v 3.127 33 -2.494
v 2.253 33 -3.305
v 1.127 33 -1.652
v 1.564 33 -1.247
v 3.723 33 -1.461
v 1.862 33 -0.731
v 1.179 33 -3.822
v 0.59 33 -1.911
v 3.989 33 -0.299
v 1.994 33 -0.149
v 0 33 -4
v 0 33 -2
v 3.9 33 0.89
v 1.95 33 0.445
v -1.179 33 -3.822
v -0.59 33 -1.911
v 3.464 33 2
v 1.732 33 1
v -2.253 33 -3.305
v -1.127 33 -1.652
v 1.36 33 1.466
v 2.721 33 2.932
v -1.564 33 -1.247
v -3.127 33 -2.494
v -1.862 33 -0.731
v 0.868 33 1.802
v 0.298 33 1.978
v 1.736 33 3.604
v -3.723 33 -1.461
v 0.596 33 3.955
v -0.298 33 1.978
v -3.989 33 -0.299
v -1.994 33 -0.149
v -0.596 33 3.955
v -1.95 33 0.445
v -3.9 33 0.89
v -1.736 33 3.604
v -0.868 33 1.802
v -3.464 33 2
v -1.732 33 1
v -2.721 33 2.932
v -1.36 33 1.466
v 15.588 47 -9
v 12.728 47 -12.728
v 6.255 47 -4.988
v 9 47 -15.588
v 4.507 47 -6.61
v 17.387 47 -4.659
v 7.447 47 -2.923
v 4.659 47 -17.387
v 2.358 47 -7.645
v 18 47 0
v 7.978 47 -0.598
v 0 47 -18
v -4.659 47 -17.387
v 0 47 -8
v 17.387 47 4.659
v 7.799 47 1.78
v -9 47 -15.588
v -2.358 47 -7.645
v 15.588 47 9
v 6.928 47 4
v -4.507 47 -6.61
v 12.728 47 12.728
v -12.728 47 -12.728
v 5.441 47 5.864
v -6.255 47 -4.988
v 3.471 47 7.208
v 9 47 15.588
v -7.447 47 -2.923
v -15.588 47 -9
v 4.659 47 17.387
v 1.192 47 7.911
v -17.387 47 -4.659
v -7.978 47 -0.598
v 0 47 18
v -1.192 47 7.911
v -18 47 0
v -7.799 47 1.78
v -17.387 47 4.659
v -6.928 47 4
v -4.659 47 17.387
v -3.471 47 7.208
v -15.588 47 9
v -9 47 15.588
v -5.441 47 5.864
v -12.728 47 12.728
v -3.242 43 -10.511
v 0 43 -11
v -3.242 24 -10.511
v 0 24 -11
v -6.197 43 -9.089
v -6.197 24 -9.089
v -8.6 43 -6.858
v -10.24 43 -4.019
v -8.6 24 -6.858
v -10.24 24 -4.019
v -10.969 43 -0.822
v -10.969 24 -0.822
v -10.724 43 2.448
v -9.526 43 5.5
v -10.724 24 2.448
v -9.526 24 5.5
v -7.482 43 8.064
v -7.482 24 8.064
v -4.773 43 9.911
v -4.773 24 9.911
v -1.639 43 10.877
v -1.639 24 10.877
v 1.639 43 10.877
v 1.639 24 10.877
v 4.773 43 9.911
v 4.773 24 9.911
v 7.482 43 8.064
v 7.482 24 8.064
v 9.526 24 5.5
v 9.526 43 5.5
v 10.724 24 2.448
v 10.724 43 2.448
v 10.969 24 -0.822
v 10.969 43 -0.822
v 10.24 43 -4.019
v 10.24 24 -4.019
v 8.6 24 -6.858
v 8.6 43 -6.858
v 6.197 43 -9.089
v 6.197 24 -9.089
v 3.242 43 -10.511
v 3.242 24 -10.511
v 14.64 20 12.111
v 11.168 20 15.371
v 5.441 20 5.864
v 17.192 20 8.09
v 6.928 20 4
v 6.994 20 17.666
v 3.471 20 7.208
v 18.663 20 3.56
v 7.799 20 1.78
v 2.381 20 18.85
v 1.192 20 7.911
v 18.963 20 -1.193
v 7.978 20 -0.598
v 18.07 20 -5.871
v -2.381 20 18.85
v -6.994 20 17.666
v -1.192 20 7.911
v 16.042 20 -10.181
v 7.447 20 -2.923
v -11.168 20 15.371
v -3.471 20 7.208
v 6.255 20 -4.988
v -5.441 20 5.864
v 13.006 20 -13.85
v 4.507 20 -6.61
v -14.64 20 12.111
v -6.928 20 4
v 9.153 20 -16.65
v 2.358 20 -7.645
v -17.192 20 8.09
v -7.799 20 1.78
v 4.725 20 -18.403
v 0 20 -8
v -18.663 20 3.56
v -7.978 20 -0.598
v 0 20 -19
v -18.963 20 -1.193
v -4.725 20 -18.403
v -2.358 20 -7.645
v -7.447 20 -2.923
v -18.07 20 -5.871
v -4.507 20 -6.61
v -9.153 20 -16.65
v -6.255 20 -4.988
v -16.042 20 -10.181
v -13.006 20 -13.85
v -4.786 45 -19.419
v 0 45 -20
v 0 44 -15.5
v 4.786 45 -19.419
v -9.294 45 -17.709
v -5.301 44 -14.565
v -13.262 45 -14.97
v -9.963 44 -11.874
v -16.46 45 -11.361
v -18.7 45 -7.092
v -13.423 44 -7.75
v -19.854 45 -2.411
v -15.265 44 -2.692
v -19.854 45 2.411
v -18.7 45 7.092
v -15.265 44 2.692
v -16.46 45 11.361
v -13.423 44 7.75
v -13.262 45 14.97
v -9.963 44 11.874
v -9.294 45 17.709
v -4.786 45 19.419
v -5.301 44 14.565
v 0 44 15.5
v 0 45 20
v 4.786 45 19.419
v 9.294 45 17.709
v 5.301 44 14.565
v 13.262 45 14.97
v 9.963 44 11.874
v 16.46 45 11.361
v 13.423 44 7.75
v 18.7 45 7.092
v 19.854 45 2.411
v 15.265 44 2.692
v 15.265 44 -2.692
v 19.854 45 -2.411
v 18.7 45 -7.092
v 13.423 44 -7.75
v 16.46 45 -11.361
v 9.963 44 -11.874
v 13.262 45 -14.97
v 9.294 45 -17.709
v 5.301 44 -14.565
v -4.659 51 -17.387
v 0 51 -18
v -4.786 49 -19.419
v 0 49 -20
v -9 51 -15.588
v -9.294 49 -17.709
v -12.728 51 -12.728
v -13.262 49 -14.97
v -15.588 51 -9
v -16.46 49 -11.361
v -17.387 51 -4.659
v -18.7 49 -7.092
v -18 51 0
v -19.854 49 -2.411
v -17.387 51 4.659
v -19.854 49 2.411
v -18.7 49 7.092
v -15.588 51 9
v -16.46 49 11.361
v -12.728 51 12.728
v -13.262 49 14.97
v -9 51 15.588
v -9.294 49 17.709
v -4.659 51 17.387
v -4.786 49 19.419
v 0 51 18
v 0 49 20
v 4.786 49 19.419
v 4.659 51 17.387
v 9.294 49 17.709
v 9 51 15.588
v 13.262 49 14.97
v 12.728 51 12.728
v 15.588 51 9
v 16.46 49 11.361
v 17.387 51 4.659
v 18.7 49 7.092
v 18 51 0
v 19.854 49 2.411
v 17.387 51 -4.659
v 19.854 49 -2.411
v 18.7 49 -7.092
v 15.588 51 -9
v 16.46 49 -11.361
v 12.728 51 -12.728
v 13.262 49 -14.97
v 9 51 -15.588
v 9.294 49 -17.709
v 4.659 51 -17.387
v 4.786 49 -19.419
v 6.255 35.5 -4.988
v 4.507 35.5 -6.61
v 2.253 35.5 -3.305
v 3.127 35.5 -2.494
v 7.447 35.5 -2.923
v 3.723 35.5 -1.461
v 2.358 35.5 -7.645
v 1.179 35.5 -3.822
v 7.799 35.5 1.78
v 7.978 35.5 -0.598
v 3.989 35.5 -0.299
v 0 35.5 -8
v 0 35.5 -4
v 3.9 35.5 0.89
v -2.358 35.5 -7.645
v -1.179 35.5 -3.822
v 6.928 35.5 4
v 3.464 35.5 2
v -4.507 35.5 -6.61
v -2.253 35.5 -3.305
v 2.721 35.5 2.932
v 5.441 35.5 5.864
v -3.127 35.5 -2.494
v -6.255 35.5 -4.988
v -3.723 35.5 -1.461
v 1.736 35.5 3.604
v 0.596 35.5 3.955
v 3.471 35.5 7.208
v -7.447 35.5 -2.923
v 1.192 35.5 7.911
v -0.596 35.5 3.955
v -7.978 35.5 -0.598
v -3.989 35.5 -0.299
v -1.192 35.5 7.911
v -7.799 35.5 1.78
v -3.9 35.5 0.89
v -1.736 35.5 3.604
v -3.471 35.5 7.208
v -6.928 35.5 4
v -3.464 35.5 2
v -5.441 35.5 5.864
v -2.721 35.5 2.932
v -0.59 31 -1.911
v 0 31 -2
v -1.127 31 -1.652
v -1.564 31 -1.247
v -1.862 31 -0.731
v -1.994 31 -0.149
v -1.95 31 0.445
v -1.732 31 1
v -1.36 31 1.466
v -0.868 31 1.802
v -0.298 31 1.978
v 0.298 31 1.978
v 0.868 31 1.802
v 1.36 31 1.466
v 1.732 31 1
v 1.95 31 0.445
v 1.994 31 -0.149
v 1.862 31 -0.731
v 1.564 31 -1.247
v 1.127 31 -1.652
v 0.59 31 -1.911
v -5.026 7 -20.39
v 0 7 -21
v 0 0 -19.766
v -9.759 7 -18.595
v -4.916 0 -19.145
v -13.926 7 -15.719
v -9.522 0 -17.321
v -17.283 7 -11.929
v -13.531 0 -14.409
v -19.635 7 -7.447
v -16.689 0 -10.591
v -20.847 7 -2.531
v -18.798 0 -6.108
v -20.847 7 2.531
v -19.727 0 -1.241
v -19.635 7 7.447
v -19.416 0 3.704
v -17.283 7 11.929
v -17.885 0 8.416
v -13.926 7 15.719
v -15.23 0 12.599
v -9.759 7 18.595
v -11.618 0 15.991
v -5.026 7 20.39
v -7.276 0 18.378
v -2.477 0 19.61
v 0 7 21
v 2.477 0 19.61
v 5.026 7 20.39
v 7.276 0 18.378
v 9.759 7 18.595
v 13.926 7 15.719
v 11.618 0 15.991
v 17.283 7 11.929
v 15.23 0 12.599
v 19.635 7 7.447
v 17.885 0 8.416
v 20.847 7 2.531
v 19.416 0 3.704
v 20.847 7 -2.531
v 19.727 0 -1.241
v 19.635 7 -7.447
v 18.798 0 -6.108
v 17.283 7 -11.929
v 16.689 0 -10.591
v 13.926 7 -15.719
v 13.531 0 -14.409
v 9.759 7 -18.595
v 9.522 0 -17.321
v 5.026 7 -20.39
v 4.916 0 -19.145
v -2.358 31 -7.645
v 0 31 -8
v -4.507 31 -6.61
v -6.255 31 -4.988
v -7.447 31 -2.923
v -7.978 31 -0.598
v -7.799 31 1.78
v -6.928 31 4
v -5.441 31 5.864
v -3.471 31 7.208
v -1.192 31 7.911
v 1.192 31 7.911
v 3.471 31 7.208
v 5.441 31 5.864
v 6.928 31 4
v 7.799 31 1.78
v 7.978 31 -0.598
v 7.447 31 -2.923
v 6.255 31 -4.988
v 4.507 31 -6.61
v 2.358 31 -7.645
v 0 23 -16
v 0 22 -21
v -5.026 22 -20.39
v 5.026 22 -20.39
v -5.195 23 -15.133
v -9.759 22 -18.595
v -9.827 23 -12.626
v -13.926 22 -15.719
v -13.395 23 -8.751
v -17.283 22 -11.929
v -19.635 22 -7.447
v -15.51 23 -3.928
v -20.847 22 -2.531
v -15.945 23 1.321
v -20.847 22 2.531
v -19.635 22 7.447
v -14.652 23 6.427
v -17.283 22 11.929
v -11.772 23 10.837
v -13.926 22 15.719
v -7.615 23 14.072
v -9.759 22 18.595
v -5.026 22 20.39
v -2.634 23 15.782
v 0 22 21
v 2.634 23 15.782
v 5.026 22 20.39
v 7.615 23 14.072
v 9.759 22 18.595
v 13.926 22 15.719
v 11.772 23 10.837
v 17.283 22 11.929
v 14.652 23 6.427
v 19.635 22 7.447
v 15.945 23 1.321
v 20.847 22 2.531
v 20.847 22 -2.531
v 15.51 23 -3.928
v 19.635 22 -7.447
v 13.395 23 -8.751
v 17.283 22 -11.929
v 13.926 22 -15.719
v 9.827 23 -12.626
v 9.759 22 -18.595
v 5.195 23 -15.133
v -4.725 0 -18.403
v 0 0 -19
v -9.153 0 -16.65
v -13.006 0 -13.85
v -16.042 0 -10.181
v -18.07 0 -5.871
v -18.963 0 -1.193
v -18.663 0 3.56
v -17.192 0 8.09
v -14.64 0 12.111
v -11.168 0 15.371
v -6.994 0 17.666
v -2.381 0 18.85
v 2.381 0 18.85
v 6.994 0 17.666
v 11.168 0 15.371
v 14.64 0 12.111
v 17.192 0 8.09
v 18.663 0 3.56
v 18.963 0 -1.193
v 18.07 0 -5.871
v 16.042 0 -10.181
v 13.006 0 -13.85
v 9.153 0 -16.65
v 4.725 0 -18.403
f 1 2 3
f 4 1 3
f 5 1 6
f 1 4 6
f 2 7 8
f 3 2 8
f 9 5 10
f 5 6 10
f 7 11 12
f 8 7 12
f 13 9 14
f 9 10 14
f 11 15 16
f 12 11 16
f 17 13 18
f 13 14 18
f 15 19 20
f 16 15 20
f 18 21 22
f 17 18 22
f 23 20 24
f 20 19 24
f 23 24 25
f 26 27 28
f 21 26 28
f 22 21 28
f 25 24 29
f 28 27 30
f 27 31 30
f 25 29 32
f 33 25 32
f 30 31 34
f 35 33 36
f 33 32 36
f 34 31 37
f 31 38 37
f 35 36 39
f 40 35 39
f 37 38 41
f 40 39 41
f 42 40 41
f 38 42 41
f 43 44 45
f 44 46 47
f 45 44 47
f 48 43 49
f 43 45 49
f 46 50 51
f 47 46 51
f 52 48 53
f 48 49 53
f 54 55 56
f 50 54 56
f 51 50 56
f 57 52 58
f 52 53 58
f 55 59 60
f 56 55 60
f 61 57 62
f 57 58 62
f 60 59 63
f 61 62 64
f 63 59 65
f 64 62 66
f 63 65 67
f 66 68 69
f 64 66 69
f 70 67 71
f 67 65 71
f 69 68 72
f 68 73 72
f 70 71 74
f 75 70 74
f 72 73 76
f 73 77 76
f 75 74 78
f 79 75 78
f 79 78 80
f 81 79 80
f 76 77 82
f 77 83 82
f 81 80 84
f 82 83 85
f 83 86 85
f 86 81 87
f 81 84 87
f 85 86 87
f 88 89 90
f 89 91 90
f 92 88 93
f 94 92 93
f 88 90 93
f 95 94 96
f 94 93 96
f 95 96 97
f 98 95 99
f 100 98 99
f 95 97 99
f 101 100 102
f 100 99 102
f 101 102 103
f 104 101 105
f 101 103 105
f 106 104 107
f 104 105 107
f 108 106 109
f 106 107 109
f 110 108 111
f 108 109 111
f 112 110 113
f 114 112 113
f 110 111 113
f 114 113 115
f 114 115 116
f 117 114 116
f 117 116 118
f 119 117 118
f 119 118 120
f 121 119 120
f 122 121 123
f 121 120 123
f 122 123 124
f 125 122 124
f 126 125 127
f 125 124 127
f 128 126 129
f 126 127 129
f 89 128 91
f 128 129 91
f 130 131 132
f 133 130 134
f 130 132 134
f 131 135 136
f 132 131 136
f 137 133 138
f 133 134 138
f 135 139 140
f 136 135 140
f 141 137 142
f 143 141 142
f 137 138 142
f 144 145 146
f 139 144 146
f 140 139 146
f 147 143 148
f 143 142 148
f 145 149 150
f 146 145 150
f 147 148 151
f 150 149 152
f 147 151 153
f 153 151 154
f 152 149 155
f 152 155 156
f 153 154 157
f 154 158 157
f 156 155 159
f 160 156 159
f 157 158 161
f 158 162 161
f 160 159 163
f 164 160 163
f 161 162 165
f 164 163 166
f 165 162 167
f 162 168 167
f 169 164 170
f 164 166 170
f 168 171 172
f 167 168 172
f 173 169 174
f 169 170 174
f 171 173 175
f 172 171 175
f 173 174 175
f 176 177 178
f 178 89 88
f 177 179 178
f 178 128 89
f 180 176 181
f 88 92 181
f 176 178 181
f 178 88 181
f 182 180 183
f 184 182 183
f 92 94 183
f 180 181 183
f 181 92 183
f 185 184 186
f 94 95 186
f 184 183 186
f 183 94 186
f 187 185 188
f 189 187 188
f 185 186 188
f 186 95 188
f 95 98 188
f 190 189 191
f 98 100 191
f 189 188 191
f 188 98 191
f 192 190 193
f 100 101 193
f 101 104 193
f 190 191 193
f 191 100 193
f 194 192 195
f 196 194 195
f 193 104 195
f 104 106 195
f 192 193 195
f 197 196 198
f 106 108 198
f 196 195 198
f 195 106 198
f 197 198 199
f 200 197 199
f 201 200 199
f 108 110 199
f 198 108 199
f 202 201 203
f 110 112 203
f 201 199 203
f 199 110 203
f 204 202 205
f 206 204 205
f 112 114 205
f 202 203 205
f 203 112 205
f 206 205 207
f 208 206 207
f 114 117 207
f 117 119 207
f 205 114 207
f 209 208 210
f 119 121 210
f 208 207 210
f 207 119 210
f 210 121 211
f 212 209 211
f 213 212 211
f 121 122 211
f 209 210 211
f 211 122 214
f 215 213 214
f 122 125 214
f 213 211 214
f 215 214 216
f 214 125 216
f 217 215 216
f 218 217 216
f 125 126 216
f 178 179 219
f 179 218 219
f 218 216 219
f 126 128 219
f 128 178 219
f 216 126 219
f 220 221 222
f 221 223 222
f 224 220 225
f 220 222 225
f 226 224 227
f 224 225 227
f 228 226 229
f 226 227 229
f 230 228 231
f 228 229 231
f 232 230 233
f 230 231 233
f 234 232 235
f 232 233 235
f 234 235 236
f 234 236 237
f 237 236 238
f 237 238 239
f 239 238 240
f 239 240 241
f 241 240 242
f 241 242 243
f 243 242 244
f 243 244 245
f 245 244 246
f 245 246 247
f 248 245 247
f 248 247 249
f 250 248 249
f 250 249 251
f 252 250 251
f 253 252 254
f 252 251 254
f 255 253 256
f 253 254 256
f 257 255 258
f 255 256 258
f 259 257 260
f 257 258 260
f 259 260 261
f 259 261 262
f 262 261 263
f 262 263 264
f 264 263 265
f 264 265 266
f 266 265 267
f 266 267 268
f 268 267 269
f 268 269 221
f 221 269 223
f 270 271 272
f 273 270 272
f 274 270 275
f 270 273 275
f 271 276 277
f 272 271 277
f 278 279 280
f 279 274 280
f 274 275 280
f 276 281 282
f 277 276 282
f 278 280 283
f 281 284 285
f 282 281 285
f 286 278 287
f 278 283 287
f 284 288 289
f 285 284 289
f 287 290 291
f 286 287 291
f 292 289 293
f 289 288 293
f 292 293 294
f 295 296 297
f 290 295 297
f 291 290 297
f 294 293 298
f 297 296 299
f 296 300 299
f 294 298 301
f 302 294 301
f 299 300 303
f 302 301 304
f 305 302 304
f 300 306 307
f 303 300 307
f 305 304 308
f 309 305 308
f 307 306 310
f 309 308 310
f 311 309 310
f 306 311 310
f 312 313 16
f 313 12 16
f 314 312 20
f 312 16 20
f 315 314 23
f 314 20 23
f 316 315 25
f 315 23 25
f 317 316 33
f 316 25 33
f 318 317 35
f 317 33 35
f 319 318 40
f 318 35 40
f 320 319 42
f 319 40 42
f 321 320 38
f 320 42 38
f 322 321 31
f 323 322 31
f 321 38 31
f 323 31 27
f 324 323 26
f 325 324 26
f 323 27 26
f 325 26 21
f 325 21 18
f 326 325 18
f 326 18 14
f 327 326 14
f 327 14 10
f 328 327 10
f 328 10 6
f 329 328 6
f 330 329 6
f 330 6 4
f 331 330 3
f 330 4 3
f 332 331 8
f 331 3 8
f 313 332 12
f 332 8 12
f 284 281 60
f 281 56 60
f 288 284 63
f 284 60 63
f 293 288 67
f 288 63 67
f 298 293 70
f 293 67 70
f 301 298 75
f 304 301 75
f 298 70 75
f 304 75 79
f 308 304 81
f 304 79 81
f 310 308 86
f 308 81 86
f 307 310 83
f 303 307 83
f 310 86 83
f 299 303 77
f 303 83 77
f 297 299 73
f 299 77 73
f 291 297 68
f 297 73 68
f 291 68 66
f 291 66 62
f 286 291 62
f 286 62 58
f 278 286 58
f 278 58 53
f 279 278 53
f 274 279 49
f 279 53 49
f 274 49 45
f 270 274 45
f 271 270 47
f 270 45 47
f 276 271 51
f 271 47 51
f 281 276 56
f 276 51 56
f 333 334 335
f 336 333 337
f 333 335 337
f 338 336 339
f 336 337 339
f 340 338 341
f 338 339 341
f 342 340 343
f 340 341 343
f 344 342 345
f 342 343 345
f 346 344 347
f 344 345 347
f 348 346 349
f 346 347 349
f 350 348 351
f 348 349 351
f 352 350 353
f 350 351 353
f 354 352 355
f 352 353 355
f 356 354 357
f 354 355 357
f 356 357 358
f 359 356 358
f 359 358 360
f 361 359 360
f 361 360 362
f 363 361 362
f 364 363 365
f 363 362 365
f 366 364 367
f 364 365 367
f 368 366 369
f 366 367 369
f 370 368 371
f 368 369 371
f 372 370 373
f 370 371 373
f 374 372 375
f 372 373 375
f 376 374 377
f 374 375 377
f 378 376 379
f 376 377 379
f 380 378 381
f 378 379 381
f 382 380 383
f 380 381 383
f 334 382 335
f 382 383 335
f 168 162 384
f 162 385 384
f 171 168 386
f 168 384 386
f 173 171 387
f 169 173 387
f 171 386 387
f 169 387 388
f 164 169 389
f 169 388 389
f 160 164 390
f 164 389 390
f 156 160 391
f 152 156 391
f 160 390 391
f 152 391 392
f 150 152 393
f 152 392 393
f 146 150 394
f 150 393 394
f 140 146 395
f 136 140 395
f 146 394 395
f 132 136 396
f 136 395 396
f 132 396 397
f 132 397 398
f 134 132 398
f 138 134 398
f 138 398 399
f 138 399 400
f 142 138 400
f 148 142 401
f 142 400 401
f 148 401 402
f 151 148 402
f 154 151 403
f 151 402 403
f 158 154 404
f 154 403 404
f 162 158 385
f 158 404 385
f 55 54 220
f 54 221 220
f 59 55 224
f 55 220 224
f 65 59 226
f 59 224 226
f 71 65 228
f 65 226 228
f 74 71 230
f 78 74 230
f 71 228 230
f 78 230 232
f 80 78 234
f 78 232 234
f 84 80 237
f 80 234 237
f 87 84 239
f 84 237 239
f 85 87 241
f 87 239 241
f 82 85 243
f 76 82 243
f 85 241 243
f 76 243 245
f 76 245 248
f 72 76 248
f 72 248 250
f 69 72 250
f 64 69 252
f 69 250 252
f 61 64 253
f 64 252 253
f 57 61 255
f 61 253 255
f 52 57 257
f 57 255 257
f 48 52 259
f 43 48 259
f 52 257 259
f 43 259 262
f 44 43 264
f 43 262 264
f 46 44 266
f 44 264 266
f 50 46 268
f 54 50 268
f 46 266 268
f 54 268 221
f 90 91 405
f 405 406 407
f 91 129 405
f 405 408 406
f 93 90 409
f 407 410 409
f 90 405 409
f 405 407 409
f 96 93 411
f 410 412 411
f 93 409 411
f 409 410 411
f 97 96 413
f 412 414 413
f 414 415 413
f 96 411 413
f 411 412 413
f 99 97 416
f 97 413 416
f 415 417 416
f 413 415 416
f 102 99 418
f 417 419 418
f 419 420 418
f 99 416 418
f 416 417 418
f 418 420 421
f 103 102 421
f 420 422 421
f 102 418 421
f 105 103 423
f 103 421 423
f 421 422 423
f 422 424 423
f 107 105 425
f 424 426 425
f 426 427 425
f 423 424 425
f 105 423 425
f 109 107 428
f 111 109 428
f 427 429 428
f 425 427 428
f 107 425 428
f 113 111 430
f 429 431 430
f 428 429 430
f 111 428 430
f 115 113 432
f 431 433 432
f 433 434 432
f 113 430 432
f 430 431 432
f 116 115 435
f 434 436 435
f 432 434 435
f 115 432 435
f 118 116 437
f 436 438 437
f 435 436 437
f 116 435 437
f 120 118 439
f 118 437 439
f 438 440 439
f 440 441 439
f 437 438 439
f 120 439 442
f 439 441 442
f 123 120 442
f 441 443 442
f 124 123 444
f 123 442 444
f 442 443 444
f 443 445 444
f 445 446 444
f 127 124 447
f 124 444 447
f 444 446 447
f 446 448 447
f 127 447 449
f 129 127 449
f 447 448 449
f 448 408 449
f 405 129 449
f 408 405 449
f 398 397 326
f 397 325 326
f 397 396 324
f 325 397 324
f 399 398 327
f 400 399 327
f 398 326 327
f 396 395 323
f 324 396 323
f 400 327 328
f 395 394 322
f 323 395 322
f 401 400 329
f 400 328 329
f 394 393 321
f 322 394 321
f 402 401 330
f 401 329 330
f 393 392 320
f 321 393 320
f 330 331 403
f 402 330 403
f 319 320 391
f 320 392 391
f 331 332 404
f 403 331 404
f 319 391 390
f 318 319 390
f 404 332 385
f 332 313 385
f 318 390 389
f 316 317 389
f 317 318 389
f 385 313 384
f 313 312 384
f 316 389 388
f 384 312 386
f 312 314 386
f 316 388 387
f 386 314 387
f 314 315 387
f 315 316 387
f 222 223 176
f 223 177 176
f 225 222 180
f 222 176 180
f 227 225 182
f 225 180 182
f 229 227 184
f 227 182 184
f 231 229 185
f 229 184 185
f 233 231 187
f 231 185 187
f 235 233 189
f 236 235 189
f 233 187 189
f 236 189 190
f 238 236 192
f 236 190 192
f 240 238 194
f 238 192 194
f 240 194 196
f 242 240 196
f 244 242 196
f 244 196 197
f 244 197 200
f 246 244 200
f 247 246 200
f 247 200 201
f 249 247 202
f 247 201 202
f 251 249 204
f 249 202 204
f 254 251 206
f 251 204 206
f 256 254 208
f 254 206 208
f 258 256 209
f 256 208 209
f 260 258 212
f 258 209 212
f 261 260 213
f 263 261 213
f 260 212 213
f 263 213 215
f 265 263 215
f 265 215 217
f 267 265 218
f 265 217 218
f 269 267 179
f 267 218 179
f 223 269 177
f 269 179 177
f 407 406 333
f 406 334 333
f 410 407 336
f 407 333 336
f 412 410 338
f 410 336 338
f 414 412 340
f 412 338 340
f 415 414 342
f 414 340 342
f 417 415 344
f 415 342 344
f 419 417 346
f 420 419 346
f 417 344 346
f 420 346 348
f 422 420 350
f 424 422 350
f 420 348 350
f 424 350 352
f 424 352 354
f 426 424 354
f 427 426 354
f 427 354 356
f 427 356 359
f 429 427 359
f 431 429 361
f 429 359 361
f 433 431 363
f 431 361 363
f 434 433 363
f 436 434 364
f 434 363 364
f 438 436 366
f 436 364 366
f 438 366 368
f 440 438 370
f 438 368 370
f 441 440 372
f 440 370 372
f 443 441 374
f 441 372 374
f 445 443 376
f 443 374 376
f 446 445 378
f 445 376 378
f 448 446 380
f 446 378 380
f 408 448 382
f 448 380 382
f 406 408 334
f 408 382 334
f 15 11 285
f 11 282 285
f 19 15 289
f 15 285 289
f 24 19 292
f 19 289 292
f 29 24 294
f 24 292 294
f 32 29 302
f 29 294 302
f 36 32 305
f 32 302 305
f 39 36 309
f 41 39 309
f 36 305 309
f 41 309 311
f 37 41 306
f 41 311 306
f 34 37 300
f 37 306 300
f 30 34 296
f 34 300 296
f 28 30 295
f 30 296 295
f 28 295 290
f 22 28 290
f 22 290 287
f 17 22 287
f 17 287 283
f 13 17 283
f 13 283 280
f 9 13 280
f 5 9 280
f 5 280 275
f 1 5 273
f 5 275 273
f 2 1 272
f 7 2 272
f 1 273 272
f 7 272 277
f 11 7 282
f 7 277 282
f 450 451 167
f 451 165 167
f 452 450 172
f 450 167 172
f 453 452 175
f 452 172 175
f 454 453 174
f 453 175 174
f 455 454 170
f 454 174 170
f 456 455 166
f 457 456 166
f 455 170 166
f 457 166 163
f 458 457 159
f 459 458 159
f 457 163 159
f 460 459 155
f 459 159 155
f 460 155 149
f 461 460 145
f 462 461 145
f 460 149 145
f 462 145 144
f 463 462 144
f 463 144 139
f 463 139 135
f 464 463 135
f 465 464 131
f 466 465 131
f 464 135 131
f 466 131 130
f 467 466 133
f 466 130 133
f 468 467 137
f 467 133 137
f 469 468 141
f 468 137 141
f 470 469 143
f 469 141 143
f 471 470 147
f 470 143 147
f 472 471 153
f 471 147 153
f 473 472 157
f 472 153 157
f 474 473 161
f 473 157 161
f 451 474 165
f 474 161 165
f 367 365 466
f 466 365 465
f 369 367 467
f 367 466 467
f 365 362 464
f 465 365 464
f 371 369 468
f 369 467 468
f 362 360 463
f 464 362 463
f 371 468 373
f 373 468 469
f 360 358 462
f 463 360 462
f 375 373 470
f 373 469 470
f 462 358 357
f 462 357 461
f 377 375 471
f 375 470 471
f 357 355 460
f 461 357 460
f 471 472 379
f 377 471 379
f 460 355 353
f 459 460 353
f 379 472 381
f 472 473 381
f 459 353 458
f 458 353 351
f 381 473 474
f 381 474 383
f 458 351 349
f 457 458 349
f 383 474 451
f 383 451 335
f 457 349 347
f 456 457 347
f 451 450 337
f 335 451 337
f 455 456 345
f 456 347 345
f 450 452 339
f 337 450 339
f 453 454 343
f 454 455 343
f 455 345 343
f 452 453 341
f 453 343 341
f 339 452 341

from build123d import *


with BuildPart() as part:
    # Sketch1 → Revolve1 (revolve)
    with BuildSketch(Plane.XY, mode=Mode.PRIVATE) as revolve1_sk:
        Polygon((20, 49), (20, 45), (11, 43), (11, 24), (21, 22), (21, 7), (19.765711135, 0), (19, 0), (19, 20), (8, 20), (8, 31), (2, 31), (2, 33), (4, 33), (4, 35.5), (8, 35.5), (8, 47), (18, 47), (18, 51), align=None)
    revolve(revolve1_sk.sketch.rotate(Axis((0, 0, 0), (0, 1, 0)), 90), axis=Axis((0, 0, 0), (0, 1, 0)))


solid = part.part
